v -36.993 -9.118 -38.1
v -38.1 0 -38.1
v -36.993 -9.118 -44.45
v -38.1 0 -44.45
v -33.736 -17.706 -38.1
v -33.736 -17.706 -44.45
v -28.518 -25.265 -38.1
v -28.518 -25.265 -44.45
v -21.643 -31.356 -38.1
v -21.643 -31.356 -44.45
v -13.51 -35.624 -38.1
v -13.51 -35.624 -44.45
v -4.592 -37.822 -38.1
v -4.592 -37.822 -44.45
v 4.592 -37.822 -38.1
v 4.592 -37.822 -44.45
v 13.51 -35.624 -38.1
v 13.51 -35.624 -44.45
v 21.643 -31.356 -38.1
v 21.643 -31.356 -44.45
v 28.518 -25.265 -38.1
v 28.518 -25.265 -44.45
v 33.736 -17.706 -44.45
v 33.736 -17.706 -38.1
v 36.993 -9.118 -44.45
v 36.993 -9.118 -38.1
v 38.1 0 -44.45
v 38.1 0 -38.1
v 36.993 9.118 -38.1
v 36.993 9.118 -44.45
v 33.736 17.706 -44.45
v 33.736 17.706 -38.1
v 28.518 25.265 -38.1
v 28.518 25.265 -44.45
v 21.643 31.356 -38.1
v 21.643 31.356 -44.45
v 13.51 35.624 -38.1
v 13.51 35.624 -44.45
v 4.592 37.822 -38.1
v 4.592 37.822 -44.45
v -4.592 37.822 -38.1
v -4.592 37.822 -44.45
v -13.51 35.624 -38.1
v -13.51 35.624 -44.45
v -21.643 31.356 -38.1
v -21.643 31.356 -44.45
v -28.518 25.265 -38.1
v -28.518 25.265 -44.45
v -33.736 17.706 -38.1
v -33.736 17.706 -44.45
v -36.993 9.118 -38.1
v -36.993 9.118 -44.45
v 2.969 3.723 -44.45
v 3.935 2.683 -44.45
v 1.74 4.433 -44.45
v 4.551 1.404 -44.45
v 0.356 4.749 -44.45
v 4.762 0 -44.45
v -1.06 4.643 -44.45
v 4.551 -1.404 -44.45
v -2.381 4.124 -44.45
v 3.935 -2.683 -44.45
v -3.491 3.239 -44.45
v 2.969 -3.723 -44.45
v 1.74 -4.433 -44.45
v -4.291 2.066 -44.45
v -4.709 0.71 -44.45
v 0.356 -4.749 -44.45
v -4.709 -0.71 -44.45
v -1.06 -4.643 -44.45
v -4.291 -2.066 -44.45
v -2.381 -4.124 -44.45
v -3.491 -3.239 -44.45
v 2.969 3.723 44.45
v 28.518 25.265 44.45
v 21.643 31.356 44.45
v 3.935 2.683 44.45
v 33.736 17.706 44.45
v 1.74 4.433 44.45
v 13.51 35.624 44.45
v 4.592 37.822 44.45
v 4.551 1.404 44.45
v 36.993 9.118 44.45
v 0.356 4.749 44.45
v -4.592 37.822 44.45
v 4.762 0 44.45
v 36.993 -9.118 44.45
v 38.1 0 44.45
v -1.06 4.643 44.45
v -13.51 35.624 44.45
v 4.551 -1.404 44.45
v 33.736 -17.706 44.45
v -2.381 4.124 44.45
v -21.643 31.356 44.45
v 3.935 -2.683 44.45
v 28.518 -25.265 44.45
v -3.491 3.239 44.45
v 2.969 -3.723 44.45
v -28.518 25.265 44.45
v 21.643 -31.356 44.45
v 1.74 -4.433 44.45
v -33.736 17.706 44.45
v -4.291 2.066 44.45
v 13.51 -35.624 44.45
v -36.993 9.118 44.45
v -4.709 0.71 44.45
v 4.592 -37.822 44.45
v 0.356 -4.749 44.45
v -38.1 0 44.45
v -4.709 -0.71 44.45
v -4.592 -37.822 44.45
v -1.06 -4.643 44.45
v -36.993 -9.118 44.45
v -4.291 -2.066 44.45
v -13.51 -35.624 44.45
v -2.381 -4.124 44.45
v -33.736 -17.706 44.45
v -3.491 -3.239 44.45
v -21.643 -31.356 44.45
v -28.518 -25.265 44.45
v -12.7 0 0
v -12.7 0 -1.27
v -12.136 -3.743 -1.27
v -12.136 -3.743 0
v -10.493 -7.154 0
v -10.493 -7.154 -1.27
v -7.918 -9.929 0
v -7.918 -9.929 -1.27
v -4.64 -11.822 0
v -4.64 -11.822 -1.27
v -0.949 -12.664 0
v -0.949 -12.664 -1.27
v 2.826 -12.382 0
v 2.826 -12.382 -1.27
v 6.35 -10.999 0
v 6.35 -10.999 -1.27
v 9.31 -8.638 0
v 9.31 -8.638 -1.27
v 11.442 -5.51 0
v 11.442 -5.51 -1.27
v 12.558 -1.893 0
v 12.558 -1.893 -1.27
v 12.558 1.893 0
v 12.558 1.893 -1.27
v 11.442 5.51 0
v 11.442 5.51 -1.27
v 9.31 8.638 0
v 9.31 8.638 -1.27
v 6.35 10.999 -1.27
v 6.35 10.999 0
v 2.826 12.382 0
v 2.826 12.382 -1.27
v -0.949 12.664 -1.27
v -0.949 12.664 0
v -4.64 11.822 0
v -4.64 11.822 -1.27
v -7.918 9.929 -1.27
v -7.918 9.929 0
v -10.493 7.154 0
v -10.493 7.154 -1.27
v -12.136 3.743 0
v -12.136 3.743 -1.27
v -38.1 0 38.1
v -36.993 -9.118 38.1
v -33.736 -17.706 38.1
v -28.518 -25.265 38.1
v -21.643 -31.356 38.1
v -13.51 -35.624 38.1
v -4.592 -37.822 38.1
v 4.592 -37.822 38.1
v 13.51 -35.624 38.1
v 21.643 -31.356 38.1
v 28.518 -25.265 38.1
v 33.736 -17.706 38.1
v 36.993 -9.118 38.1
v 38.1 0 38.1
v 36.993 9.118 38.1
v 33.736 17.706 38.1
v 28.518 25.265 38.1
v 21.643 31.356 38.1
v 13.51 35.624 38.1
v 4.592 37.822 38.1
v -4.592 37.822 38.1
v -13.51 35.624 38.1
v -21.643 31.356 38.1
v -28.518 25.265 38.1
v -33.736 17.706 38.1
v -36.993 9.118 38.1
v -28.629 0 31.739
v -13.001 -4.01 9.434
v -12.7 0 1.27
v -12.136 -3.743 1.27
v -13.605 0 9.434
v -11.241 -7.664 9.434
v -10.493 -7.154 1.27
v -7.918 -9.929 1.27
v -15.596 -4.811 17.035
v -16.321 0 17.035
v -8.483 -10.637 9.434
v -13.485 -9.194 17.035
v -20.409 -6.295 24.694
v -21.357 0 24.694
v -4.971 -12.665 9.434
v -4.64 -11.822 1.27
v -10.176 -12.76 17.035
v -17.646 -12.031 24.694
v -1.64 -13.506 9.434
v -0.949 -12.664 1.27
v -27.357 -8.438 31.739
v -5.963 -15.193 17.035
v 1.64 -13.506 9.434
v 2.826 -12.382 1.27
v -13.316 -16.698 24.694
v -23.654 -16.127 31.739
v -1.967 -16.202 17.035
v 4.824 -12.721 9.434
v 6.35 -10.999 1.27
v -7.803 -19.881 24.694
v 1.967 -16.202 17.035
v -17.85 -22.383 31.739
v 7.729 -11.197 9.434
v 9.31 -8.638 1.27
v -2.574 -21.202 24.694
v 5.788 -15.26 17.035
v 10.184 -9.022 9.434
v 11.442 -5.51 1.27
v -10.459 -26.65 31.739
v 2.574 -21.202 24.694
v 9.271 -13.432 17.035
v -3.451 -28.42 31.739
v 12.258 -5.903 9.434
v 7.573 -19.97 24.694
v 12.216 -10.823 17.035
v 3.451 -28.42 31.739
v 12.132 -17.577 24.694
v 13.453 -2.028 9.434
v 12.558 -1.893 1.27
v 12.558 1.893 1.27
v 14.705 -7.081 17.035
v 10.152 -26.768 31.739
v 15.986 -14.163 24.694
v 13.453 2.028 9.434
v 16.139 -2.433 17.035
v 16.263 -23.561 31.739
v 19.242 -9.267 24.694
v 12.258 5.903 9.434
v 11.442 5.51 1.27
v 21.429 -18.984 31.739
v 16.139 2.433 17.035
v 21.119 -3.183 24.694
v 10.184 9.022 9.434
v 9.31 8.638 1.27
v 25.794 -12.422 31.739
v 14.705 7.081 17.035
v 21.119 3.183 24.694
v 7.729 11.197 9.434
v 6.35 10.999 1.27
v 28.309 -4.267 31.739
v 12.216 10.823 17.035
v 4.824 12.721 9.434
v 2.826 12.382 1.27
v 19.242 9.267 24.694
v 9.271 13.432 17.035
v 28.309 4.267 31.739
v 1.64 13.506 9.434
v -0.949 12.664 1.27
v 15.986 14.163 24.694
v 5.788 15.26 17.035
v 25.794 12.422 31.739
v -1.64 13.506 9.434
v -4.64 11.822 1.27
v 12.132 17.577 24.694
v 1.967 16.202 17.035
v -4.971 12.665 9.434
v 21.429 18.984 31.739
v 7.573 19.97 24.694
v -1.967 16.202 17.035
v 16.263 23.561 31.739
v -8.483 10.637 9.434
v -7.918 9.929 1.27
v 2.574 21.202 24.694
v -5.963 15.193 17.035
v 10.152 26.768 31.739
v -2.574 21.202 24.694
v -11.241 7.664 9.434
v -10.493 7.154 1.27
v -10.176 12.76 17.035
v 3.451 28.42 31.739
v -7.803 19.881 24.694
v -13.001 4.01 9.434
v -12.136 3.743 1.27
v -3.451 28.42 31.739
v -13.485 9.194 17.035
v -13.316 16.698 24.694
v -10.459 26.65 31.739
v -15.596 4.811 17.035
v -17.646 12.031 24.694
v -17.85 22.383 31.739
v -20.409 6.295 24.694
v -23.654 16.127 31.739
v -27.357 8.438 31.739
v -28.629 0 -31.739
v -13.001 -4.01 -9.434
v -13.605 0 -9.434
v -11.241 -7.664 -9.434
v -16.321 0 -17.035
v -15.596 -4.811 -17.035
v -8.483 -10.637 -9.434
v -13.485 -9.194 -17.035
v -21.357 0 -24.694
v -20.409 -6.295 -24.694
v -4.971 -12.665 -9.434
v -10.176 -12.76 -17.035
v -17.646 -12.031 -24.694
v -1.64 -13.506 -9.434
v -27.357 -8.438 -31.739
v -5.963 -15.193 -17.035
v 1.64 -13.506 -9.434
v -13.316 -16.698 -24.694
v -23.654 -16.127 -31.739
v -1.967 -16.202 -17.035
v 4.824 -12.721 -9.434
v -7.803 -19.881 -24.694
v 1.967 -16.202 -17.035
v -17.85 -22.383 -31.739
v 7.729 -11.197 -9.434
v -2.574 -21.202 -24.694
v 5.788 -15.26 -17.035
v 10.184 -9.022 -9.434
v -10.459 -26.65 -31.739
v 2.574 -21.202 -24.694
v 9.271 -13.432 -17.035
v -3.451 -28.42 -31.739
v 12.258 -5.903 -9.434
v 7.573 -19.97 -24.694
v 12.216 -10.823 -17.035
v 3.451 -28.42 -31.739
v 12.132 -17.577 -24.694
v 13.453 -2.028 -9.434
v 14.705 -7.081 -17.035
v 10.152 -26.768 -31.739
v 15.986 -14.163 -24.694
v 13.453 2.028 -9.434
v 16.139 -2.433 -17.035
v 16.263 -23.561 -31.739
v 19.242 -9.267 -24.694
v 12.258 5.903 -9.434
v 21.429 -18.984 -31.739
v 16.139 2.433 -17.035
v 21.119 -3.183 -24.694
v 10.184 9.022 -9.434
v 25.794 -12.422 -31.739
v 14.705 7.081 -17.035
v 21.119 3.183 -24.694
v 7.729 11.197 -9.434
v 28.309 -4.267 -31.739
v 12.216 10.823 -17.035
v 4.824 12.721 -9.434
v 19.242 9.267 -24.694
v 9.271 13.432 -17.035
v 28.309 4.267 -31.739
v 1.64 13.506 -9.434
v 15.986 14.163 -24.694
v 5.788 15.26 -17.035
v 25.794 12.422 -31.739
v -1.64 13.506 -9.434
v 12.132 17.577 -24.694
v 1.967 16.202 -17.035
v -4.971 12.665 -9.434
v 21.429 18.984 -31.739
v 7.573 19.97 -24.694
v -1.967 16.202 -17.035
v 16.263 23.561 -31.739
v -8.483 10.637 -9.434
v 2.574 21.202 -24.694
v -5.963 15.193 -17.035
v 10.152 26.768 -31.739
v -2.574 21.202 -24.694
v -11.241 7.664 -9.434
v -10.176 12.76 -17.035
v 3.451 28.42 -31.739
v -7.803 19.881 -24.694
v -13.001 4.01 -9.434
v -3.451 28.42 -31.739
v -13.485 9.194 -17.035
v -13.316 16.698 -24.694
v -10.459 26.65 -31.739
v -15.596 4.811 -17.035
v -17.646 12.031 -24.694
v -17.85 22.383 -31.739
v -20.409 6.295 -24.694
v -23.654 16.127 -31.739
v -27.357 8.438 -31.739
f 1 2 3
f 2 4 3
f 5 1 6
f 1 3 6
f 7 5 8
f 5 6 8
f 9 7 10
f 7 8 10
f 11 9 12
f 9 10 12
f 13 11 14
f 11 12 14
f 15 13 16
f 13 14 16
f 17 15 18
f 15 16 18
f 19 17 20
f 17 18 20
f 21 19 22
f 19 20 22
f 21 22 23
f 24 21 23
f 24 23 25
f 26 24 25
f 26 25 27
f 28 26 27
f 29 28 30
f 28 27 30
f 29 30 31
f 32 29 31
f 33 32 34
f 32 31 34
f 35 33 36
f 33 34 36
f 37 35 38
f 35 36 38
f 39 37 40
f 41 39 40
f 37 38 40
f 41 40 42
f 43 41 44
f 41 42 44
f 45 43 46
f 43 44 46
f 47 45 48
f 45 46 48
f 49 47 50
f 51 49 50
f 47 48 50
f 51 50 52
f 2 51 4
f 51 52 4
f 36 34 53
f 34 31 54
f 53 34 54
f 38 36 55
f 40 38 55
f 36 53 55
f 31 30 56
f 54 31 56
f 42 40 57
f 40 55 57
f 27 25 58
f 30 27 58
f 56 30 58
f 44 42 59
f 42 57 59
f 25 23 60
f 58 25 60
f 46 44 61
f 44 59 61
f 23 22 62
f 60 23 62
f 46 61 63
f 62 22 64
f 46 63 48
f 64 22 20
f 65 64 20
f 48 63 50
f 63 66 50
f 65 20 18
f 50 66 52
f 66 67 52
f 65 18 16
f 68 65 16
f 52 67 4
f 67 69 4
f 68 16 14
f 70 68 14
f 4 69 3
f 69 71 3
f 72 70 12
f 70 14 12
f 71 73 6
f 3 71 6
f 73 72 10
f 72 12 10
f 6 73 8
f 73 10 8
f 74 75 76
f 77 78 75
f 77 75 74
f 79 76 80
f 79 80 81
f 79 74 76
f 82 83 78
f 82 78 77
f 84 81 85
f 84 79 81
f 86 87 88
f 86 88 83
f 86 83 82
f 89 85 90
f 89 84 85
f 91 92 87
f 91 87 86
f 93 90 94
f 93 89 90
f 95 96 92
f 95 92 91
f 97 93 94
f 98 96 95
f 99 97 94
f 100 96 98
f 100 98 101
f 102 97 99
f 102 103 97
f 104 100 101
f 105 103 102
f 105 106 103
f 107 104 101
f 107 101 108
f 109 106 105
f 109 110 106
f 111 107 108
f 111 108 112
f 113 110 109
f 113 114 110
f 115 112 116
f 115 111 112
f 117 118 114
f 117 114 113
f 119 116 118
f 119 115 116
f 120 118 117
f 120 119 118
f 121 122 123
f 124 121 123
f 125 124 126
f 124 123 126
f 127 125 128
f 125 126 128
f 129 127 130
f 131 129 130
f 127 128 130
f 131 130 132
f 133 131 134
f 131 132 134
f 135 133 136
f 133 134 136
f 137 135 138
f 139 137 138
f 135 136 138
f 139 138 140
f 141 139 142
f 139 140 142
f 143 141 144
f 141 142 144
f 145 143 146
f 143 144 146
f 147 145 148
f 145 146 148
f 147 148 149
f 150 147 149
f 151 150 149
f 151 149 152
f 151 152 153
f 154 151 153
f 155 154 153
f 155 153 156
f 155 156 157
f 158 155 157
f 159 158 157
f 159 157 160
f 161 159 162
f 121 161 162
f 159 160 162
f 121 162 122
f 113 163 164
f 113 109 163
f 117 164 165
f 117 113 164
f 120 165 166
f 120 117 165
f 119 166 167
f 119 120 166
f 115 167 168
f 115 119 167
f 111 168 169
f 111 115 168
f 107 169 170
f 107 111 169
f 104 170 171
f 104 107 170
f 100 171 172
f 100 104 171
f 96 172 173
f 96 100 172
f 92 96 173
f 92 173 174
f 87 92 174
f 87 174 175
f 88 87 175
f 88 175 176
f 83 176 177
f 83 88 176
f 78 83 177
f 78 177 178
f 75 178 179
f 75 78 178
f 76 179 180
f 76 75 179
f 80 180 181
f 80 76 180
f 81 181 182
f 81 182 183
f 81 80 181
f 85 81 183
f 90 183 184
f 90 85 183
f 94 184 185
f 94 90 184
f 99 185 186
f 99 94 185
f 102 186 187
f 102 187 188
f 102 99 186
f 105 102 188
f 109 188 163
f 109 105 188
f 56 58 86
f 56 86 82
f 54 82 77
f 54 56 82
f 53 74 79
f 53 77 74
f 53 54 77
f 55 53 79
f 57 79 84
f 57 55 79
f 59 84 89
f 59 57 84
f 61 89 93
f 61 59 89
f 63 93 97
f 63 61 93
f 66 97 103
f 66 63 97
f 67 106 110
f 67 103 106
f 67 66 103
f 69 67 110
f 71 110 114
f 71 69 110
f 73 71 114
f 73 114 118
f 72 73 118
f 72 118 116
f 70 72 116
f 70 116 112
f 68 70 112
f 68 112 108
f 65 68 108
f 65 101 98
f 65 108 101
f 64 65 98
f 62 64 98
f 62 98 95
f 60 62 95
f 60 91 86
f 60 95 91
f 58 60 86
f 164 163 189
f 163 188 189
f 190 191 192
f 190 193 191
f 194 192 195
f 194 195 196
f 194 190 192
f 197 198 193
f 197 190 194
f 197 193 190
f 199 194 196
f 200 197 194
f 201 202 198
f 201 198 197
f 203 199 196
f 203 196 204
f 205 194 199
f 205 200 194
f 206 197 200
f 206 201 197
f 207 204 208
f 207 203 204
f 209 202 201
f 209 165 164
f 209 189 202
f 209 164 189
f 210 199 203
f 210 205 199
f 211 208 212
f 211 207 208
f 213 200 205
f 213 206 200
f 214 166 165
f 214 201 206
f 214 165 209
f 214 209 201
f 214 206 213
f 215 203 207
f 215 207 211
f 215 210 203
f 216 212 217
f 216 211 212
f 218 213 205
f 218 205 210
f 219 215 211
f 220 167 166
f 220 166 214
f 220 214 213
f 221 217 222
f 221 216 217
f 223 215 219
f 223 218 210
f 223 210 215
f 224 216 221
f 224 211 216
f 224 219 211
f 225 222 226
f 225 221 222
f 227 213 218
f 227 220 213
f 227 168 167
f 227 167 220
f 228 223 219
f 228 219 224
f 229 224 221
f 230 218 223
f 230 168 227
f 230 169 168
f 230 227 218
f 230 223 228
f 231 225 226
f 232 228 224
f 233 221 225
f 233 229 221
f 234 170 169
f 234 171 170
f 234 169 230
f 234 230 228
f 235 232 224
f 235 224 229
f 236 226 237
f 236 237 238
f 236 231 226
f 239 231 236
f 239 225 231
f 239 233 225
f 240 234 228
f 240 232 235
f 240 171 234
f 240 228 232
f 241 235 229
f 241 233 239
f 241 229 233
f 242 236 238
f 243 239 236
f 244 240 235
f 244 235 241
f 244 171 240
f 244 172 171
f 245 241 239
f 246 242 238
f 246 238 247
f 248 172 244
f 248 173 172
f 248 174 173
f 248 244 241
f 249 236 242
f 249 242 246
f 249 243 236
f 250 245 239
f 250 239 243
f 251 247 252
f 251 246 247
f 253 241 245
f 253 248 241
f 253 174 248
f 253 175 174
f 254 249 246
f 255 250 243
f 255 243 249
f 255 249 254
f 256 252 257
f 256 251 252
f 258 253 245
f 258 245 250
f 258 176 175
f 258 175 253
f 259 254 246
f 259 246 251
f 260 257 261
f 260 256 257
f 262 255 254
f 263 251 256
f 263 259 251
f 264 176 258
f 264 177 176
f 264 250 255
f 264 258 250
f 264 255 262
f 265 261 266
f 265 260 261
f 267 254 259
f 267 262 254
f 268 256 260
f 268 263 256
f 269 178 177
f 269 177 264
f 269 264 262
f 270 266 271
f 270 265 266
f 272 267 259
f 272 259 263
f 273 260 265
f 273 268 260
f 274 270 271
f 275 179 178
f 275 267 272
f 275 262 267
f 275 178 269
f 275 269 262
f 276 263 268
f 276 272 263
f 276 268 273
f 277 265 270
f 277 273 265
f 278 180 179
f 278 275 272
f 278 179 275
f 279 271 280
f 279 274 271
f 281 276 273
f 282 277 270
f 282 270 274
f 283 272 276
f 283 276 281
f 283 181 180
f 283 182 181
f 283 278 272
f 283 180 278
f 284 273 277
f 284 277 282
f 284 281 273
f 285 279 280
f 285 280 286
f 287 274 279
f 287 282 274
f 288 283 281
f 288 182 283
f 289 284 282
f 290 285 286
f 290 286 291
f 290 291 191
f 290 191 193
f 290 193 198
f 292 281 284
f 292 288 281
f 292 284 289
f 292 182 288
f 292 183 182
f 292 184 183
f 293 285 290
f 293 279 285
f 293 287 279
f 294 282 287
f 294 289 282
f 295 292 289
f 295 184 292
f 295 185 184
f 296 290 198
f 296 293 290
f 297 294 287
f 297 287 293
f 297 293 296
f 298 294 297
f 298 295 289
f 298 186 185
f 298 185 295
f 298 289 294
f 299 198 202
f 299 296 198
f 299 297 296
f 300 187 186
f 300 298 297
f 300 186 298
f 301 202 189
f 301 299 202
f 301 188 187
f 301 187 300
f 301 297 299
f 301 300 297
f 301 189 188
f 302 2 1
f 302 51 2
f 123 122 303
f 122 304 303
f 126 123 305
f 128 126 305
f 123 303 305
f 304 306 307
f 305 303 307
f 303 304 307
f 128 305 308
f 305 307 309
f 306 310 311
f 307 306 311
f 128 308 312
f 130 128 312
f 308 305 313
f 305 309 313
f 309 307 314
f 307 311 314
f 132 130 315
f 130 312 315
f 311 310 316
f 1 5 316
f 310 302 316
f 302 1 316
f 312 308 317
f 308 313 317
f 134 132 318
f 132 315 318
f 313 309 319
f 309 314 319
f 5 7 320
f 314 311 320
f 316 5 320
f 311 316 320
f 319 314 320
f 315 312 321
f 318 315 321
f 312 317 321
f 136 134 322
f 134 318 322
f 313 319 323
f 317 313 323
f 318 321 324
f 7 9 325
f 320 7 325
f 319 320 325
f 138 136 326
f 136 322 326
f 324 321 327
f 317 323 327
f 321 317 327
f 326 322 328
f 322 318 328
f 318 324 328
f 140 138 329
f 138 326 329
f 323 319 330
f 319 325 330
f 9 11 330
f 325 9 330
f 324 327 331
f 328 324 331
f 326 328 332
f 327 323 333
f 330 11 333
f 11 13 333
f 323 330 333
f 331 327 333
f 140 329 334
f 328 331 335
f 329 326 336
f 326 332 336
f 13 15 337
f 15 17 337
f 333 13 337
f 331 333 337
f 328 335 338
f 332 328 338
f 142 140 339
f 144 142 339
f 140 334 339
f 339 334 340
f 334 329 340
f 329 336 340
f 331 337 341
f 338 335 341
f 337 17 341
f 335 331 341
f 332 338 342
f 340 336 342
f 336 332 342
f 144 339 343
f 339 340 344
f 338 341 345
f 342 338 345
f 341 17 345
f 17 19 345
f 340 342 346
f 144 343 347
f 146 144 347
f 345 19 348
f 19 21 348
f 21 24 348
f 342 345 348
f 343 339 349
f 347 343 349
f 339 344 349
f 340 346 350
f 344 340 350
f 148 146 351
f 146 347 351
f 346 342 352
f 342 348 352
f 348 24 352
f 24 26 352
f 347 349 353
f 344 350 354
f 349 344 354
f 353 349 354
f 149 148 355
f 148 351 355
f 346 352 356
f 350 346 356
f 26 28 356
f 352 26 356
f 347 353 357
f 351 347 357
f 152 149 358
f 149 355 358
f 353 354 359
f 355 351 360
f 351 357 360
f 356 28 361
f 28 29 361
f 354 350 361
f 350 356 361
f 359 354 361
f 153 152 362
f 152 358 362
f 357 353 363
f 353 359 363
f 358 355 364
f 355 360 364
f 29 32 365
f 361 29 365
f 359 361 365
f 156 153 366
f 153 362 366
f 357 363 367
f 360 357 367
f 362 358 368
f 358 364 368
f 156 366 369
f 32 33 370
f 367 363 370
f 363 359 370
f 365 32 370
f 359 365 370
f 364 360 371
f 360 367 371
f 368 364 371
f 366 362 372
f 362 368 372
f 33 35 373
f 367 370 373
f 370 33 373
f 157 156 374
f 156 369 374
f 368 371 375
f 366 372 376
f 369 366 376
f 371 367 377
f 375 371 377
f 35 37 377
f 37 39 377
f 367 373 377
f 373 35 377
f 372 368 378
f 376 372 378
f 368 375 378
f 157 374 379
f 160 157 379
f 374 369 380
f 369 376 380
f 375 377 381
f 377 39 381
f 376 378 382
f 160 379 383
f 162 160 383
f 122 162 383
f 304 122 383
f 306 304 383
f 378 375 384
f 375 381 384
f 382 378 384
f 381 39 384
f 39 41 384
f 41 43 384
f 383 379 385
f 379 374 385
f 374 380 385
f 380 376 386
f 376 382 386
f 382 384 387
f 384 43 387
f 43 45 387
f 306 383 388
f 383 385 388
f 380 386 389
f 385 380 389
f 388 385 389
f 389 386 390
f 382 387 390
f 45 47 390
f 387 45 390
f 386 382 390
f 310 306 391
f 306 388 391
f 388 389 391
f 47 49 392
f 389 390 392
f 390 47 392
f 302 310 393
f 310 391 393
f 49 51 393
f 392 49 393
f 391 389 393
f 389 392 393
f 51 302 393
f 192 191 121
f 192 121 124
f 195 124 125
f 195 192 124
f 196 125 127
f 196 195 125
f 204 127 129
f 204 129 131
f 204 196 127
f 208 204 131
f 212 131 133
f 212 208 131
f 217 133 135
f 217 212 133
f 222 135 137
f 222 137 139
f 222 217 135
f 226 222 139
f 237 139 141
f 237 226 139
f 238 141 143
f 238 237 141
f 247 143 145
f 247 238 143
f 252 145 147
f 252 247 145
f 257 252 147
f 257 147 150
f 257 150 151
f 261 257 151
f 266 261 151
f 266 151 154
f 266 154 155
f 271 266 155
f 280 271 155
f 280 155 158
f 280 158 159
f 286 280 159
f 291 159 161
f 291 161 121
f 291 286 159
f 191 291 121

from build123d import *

# Parameters (mm, degrees)
CUT_EXTRUDE1_DEPTH      = 70.850000109
CUT_EXTRUDE1_DEPTH_BACK = 70.850000109
SKETCH2_R               = 4.7625


with BuildPart() as part:
    # Sketch1 → Revolve1 (revolve)
    with BuildSketch(Plane(origin=(0, 0, 0), x_dir=(0, 0, -1), z_dir=(1, 0, 0)), mode=Mode.PRIVATE) as revolve1_sk:
        with BuildLine():
            Line((0, 0), (0, 12.7))
            Line((0, 12.7), (1.27, 12.7))
            add(Edge.make_bspline(
                [(1.27, 12.7), (23.639666793, 12.7), (38.1, 38.1)],
                knots=[0, 0, 0, 1, 1, 1], degree=2))
            Line((38.1, 38.1), (44.45, 38.1))
            Line((44.45, 38.1), (44.45, 0))
            Line((44.45, 0), (0, 0))
        make_face()
    revolve1 = revolve(revolve1_sk.sketch.rotate(Axis((0, 0, -51.236845644), (0, 0, 1)), 90), axis=Axis((0, 0, -51.236845644), (0, 0, 1)))

    # Mirror1: Revolve1 across plane
    add(revolve1.mirror(Plane.XY))

    # Sketch2 → Cut-Extrude1 (cut, two sides: drawn at the far end of the back side and taken through both)
    with BuildSketch(Plane.XY.offset(-CUT_EXTRUDE1_DEPTH_BACK)):
        Circle(SKETCH2_R)
    extrude(amount=CUT_EXTRUDE1_DEPTH + CUT_EXTRUDE1_DEPTH_BACK, mode=Mode.SUBTRACT)


solid = part.part
